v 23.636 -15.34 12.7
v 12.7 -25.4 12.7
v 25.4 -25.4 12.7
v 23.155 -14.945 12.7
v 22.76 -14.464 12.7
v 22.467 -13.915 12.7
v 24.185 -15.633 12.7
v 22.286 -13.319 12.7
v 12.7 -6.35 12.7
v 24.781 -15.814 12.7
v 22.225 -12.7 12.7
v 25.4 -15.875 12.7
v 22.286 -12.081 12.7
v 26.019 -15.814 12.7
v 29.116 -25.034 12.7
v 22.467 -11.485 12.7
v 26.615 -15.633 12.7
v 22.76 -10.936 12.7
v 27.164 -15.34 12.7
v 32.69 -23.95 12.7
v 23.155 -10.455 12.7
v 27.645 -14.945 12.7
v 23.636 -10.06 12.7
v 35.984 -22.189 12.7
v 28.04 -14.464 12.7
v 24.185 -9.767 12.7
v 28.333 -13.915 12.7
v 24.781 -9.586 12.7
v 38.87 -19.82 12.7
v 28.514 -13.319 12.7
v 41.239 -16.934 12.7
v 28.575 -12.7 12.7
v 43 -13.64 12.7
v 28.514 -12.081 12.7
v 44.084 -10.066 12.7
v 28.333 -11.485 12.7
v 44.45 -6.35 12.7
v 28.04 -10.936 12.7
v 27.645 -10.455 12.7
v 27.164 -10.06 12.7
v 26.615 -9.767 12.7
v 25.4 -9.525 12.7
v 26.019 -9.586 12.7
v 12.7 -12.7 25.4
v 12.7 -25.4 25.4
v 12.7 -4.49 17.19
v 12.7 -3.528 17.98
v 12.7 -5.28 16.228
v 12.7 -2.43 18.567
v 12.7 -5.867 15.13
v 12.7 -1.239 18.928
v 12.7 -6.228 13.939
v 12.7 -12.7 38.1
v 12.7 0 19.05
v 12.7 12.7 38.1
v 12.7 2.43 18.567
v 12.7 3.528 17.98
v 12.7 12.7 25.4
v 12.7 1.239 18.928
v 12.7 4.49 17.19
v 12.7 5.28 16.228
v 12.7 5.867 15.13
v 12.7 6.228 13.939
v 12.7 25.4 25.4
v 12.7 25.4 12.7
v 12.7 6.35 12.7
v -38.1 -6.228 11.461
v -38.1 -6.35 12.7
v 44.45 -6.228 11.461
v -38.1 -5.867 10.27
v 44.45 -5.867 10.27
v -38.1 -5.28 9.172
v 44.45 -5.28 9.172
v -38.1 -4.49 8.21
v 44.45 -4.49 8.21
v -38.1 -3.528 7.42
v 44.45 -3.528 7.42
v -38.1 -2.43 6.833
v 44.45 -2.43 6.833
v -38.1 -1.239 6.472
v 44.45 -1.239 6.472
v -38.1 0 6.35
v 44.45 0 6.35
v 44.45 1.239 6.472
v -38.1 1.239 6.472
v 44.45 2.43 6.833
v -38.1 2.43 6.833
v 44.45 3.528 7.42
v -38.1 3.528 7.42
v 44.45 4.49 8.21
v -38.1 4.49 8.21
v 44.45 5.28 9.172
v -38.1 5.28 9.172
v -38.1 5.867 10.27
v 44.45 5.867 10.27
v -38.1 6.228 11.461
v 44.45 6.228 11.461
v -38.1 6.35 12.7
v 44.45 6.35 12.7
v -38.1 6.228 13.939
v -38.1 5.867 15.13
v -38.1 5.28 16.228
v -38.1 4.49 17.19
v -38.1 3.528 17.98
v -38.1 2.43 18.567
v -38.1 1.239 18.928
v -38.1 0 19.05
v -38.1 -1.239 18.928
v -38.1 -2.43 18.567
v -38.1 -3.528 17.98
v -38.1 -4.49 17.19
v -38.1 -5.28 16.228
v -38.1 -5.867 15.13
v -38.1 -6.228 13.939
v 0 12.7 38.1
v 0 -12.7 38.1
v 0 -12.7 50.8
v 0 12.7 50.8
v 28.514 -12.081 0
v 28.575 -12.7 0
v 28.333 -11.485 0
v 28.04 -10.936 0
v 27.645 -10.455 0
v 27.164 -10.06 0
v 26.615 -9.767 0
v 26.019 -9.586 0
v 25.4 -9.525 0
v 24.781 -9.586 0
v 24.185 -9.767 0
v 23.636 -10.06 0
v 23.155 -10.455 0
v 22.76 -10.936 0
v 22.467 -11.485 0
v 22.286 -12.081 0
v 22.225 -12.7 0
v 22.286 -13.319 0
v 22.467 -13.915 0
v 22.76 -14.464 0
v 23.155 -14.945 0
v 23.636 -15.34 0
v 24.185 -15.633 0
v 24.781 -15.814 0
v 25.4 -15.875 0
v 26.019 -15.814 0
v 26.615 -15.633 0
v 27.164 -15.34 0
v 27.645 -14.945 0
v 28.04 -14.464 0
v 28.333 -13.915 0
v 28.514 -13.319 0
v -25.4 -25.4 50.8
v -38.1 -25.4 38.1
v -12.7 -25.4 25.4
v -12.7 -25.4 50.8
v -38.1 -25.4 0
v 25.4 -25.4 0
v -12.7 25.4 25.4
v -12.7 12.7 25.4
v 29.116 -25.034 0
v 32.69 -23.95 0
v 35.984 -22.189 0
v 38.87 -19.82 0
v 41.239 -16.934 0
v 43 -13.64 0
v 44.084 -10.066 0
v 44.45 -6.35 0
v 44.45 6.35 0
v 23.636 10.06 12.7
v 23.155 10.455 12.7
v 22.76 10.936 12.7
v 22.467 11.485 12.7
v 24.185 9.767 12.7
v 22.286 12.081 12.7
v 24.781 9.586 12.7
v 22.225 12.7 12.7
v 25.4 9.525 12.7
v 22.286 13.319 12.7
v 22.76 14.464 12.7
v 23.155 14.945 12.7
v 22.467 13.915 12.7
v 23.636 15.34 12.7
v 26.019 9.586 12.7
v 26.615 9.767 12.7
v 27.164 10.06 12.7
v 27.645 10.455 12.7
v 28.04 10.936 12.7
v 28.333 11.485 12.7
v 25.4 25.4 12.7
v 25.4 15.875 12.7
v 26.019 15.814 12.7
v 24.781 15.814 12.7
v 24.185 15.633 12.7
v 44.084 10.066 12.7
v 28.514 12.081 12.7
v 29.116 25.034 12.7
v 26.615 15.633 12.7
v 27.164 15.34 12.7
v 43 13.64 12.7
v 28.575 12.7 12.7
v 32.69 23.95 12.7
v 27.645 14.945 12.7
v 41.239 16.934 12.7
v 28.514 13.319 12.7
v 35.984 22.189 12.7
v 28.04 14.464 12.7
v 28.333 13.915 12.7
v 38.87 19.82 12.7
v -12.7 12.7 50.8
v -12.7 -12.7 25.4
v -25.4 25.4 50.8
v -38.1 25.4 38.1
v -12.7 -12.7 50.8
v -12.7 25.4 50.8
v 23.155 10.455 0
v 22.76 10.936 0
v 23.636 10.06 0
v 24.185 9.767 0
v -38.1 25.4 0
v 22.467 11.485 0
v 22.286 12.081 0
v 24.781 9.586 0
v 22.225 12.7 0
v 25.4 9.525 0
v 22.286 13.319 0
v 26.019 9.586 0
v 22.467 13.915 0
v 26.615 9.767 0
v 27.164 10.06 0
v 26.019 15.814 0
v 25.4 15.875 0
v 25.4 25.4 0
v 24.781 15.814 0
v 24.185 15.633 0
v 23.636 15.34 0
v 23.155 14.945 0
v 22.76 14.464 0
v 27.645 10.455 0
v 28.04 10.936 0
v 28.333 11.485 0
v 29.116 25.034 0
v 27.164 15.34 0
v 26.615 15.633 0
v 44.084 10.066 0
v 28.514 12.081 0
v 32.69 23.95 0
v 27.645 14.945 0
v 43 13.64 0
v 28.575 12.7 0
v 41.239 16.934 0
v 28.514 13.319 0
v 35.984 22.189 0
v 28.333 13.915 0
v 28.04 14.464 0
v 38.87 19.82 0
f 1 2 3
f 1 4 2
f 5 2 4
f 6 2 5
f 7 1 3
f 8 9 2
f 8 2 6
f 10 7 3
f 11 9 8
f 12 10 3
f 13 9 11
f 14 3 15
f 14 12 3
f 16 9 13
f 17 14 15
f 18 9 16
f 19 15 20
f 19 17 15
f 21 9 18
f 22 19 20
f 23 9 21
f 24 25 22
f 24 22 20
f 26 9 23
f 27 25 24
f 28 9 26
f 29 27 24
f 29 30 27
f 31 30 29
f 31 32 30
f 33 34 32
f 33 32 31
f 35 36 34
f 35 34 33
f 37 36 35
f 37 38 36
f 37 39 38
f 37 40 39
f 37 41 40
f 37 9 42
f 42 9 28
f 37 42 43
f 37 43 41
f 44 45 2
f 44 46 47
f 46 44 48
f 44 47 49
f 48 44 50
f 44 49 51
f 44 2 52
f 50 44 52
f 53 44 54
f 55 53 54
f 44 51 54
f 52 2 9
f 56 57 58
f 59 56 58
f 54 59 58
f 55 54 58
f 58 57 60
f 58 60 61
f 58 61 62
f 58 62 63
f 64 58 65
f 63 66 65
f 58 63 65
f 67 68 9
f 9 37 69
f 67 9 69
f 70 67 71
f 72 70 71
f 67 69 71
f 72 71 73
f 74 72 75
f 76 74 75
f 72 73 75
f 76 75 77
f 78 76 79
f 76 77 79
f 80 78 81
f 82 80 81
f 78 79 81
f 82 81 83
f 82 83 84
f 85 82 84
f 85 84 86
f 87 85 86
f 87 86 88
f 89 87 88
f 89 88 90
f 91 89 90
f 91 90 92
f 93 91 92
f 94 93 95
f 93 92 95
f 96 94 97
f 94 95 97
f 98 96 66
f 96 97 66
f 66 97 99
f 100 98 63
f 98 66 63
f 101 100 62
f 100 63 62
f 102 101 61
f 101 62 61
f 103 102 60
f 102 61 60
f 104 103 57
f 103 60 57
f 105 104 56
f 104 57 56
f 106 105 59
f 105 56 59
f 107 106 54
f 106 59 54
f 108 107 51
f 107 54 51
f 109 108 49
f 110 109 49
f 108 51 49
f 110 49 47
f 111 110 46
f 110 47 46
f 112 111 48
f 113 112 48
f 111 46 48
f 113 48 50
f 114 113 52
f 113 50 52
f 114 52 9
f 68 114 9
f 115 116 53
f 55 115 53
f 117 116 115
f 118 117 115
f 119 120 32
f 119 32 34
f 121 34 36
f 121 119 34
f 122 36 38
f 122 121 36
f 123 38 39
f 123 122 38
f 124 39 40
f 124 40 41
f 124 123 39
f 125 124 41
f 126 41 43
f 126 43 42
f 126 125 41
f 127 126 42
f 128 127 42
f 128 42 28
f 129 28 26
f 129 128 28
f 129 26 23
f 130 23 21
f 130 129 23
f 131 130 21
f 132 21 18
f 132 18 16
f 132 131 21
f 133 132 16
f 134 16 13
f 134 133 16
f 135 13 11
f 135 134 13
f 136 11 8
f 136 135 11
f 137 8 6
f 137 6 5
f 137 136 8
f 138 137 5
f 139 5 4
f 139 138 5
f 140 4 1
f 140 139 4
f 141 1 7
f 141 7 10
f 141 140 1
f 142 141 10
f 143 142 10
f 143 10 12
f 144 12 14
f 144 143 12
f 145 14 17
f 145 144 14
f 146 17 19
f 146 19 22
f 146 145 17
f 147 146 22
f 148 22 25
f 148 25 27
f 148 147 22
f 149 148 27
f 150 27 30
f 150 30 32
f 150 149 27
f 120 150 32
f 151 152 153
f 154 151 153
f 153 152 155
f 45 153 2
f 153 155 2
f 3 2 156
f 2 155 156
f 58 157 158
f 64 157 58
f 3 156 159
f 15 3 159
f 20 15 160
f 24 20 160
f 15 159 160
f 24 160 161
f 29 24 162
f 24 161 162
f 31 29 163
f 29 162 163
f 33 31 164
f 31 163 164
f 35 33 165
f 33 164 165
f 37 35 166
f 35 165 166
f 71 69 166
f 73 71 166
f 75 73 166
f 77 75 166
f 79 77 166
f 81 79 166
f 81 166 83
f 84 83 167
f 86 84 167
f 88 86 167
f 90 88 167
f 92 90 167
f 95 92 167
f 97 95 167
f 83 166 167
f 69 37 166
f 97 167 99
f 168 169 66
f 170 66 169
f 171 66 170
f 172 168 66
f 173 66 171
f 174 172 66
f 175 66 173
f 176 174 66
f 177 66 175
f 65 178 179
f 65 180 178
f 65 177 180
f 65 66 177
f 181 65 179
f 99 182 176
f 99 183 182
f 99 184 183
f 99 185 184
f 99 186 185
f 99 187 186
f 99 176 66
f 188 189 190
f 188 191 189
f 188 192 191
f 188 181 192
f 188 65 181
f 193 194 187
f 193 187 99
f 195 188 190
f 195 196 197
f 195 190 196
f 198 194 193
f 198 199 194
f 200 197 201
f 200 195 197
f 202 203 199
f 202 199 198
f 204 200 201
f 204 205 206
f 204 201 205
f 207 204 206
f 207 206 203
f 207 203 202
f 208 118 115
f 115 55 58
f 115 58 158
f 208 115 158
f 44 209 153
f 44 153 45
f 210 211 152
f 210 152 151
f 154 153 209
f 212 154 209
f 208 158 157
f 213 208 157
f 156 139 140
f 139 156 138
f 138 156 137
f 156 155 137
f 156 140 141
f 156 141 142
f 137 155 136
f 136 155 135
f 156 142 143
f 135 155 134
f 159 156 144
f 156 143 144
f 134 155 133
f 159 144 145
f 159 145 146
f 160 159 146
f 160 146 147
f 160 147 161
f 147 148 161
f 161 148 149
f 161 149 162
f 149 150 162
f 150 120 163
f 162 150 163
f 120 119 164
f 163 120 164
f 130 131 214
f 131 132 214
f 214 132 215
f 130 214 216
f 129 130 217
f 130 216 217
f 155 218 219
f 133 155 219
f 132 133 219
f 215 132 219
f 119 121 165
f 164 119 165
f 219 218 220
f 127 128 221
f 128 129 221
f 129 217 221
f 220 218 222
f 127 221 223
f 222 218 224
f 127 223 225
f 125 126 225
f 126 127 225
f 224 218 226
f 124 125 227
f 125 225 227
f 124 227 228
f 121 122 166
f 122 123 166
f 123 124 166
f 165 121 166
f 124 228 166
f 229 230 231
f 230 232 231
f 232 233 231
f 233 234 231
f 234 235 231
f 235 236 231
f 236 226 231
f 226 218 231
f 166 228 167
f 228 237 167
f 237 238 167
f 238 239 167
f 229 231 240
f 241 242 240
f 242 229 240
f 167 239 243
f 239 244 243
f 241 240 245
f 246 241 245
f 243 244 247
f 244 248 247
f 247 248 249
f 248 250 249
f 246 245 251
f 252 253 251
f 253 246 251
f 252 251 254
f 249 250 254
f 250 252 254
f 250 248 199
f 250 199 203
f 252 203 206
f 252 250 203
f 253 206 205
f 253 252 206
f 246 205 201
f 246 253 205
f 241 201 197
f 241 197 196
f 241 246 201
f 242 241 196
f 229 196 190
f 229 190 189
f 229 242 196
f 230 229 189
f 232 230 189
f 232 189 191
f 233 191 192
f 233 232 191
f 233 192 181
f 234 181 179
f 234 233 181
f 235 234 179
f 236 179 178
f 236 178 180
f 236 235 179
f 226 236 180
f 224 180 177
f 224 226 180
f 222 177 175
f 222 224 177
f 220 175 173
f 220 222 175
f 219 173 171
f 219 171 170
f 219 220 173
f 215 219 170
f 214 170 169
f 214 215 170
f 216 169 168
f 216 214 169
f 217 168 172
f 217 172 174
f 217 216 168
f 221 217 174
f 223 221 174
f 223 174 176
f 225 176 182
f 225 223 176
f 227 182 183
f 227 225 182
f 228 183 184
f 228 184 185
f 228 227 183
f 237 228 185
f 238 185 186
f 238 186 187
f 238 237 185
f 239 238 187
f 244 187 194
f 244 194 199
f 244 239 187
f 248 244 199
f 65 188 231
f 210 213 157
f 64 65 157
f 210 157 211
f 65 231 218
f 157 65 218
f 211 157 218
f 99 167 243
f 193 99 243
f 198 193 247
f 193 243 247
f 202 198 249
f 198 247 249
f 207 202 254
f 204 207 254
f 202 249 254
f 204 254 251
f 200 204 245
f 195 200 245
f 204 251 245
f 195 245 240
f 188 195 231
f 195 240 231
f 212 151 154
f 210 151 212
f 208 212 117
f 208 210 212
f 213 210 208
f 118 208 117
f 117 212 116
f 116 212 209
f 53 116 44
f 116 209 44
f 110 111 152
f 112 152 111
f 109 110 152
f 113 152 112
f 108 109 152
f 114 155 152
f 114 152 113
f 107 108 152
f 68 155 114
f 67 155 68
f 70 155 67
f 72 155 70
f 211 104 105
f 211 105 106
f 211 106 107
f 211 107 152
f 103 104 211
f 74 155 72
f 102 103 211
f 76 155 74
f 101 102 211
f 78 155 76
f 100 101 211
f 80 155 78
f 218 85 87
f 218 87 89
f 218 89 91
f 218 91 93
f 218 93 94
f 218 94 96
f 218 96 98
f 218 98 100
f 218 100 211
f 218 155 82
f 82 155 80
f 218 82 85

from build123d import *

# Parameters (mm, degrees)
F0_R     = 3.175
F0_W     = 31.75
F0_H     = 12.7
F1_DEPTH = 12.7
F2_DEPTH = 25.4
F3_DEPTH = 38.1
F0_W_2   = 12.7
F0_H_2   = 50.8
F4_DEPTH = 50.8
F6_DEPTH = 50.801
F8_DEPTH = 82.551


with BuildPart() as f1:
    # F0 (on Top) → F1 (new body)
    with BuildSketch(Plane.XY):
        with BuildLine():
            Line((12.7, -12.7), (12.7, -25.4))
            Line((12.7, -25.4), (25.4, -25.4))
            ThreePointArc((25.4, -25.4), (38.870384, -19.820384), (44.45, -6.35))
            Line((44.45, -6.35), (12.7, -6.35))
            Line((12.7, -6.35), (12.7, -12.7))
        make_face()
        with Locations((25.4, -12.7)):
            Circle(F0_R, mode=Mode.SUBTRACT)
        with Locations((28.575, 0)):
            Rectangle(F0_W, F0_H)
        with BuildLine():
            Line((25.4, 25.4), (12.7, 25.4))
            Line((12.7, 25.4), (12.7, 12.7))
            Line((12.7, 12.7), (12.7, 6.35))
            Line((12.7, 6.35), (44.45, 6.35))
            ThreePointArc((44.45, 6.35), (38.870384, 19.820384), (25.4, 25.4))
        make_face()
        with Locations((25.4, 12.7)):
            Circle(F0_R, mode=Mode.SUBTRACT)
    extrude(amount=F1_DEPTH)

    # F0 (on Top) → F2 (join)
    with BuildSketch(Plane.XY):
        Polygon((-12.7, -12.7), (-12.7, -25.4), (12.7, -25.4), (12.7, -12.7), (0, -12.7), align=None)
        Polygon((12.7, 25.4), (-12.7, 25.4), (-12.7, 12.7), (0, 12.7), (12.7, 12.7), align=None)
    extrude(amount=F2_DEPTH)

    # F0 (on Top) → F3 (join)
    with BuildSketch(Plane.XY):
        Polygon((12.7, 12.7), (0, 12.7), (0, -12.7), (12.7, -12.7), (12.7, -6.35), (12.7, 6.35), align=None)
    extrude(amount=F3_DEPTH)

    # F0 (on Top) → F4 (join)
    with BuildSketch(Plane.XY):
        with Locations((-31.75, 0)):
            Rectangle(F0_W_2, F0_H_2)
        Polygon((-12.7, 25.4), (-25.4, 25.4), (-25.4, -25.4), (-12.7, -25.4), (-12.7, -12.7), (0, -12.7), (0, 12.7), (-12.7, 12.7), align=None)
    extrude(amount=F4_DEPTH)

    # F5 (on face) → F6 (cut, through all)
    with BuildSketch(Plane.XZ.offset(25.4)):
        Polygon((-25.4, 50.8), (-38.1, 50.8), (-38.1, 38.1), align=None)
    extrude(amount=-F6_DEPTH, mode=Mode.SUBTRACT)

    # F7 (on face) → F8 (cut, through all)
    with BuildSketch(Plane.YZ.offset(44.45)):
        with BuildLine():
            Line((-6.35, 12.7), (6.35, 12.7))
            ThreePointArc((6.35, 12.7), (0, 19.05), (-6.35, 12.7))
        make_face()
        with BuildLine():
            ThreePointArc((-6.35, 12.7), (0, 6.35), (6.35, 12.7))
            Line((6.35, 12.7), (-6.35, 12.7))
        make_face()
    extrude(amount=-F8_DEPTH, mode=Mode.SUBTRACT)


solid = f1.part
